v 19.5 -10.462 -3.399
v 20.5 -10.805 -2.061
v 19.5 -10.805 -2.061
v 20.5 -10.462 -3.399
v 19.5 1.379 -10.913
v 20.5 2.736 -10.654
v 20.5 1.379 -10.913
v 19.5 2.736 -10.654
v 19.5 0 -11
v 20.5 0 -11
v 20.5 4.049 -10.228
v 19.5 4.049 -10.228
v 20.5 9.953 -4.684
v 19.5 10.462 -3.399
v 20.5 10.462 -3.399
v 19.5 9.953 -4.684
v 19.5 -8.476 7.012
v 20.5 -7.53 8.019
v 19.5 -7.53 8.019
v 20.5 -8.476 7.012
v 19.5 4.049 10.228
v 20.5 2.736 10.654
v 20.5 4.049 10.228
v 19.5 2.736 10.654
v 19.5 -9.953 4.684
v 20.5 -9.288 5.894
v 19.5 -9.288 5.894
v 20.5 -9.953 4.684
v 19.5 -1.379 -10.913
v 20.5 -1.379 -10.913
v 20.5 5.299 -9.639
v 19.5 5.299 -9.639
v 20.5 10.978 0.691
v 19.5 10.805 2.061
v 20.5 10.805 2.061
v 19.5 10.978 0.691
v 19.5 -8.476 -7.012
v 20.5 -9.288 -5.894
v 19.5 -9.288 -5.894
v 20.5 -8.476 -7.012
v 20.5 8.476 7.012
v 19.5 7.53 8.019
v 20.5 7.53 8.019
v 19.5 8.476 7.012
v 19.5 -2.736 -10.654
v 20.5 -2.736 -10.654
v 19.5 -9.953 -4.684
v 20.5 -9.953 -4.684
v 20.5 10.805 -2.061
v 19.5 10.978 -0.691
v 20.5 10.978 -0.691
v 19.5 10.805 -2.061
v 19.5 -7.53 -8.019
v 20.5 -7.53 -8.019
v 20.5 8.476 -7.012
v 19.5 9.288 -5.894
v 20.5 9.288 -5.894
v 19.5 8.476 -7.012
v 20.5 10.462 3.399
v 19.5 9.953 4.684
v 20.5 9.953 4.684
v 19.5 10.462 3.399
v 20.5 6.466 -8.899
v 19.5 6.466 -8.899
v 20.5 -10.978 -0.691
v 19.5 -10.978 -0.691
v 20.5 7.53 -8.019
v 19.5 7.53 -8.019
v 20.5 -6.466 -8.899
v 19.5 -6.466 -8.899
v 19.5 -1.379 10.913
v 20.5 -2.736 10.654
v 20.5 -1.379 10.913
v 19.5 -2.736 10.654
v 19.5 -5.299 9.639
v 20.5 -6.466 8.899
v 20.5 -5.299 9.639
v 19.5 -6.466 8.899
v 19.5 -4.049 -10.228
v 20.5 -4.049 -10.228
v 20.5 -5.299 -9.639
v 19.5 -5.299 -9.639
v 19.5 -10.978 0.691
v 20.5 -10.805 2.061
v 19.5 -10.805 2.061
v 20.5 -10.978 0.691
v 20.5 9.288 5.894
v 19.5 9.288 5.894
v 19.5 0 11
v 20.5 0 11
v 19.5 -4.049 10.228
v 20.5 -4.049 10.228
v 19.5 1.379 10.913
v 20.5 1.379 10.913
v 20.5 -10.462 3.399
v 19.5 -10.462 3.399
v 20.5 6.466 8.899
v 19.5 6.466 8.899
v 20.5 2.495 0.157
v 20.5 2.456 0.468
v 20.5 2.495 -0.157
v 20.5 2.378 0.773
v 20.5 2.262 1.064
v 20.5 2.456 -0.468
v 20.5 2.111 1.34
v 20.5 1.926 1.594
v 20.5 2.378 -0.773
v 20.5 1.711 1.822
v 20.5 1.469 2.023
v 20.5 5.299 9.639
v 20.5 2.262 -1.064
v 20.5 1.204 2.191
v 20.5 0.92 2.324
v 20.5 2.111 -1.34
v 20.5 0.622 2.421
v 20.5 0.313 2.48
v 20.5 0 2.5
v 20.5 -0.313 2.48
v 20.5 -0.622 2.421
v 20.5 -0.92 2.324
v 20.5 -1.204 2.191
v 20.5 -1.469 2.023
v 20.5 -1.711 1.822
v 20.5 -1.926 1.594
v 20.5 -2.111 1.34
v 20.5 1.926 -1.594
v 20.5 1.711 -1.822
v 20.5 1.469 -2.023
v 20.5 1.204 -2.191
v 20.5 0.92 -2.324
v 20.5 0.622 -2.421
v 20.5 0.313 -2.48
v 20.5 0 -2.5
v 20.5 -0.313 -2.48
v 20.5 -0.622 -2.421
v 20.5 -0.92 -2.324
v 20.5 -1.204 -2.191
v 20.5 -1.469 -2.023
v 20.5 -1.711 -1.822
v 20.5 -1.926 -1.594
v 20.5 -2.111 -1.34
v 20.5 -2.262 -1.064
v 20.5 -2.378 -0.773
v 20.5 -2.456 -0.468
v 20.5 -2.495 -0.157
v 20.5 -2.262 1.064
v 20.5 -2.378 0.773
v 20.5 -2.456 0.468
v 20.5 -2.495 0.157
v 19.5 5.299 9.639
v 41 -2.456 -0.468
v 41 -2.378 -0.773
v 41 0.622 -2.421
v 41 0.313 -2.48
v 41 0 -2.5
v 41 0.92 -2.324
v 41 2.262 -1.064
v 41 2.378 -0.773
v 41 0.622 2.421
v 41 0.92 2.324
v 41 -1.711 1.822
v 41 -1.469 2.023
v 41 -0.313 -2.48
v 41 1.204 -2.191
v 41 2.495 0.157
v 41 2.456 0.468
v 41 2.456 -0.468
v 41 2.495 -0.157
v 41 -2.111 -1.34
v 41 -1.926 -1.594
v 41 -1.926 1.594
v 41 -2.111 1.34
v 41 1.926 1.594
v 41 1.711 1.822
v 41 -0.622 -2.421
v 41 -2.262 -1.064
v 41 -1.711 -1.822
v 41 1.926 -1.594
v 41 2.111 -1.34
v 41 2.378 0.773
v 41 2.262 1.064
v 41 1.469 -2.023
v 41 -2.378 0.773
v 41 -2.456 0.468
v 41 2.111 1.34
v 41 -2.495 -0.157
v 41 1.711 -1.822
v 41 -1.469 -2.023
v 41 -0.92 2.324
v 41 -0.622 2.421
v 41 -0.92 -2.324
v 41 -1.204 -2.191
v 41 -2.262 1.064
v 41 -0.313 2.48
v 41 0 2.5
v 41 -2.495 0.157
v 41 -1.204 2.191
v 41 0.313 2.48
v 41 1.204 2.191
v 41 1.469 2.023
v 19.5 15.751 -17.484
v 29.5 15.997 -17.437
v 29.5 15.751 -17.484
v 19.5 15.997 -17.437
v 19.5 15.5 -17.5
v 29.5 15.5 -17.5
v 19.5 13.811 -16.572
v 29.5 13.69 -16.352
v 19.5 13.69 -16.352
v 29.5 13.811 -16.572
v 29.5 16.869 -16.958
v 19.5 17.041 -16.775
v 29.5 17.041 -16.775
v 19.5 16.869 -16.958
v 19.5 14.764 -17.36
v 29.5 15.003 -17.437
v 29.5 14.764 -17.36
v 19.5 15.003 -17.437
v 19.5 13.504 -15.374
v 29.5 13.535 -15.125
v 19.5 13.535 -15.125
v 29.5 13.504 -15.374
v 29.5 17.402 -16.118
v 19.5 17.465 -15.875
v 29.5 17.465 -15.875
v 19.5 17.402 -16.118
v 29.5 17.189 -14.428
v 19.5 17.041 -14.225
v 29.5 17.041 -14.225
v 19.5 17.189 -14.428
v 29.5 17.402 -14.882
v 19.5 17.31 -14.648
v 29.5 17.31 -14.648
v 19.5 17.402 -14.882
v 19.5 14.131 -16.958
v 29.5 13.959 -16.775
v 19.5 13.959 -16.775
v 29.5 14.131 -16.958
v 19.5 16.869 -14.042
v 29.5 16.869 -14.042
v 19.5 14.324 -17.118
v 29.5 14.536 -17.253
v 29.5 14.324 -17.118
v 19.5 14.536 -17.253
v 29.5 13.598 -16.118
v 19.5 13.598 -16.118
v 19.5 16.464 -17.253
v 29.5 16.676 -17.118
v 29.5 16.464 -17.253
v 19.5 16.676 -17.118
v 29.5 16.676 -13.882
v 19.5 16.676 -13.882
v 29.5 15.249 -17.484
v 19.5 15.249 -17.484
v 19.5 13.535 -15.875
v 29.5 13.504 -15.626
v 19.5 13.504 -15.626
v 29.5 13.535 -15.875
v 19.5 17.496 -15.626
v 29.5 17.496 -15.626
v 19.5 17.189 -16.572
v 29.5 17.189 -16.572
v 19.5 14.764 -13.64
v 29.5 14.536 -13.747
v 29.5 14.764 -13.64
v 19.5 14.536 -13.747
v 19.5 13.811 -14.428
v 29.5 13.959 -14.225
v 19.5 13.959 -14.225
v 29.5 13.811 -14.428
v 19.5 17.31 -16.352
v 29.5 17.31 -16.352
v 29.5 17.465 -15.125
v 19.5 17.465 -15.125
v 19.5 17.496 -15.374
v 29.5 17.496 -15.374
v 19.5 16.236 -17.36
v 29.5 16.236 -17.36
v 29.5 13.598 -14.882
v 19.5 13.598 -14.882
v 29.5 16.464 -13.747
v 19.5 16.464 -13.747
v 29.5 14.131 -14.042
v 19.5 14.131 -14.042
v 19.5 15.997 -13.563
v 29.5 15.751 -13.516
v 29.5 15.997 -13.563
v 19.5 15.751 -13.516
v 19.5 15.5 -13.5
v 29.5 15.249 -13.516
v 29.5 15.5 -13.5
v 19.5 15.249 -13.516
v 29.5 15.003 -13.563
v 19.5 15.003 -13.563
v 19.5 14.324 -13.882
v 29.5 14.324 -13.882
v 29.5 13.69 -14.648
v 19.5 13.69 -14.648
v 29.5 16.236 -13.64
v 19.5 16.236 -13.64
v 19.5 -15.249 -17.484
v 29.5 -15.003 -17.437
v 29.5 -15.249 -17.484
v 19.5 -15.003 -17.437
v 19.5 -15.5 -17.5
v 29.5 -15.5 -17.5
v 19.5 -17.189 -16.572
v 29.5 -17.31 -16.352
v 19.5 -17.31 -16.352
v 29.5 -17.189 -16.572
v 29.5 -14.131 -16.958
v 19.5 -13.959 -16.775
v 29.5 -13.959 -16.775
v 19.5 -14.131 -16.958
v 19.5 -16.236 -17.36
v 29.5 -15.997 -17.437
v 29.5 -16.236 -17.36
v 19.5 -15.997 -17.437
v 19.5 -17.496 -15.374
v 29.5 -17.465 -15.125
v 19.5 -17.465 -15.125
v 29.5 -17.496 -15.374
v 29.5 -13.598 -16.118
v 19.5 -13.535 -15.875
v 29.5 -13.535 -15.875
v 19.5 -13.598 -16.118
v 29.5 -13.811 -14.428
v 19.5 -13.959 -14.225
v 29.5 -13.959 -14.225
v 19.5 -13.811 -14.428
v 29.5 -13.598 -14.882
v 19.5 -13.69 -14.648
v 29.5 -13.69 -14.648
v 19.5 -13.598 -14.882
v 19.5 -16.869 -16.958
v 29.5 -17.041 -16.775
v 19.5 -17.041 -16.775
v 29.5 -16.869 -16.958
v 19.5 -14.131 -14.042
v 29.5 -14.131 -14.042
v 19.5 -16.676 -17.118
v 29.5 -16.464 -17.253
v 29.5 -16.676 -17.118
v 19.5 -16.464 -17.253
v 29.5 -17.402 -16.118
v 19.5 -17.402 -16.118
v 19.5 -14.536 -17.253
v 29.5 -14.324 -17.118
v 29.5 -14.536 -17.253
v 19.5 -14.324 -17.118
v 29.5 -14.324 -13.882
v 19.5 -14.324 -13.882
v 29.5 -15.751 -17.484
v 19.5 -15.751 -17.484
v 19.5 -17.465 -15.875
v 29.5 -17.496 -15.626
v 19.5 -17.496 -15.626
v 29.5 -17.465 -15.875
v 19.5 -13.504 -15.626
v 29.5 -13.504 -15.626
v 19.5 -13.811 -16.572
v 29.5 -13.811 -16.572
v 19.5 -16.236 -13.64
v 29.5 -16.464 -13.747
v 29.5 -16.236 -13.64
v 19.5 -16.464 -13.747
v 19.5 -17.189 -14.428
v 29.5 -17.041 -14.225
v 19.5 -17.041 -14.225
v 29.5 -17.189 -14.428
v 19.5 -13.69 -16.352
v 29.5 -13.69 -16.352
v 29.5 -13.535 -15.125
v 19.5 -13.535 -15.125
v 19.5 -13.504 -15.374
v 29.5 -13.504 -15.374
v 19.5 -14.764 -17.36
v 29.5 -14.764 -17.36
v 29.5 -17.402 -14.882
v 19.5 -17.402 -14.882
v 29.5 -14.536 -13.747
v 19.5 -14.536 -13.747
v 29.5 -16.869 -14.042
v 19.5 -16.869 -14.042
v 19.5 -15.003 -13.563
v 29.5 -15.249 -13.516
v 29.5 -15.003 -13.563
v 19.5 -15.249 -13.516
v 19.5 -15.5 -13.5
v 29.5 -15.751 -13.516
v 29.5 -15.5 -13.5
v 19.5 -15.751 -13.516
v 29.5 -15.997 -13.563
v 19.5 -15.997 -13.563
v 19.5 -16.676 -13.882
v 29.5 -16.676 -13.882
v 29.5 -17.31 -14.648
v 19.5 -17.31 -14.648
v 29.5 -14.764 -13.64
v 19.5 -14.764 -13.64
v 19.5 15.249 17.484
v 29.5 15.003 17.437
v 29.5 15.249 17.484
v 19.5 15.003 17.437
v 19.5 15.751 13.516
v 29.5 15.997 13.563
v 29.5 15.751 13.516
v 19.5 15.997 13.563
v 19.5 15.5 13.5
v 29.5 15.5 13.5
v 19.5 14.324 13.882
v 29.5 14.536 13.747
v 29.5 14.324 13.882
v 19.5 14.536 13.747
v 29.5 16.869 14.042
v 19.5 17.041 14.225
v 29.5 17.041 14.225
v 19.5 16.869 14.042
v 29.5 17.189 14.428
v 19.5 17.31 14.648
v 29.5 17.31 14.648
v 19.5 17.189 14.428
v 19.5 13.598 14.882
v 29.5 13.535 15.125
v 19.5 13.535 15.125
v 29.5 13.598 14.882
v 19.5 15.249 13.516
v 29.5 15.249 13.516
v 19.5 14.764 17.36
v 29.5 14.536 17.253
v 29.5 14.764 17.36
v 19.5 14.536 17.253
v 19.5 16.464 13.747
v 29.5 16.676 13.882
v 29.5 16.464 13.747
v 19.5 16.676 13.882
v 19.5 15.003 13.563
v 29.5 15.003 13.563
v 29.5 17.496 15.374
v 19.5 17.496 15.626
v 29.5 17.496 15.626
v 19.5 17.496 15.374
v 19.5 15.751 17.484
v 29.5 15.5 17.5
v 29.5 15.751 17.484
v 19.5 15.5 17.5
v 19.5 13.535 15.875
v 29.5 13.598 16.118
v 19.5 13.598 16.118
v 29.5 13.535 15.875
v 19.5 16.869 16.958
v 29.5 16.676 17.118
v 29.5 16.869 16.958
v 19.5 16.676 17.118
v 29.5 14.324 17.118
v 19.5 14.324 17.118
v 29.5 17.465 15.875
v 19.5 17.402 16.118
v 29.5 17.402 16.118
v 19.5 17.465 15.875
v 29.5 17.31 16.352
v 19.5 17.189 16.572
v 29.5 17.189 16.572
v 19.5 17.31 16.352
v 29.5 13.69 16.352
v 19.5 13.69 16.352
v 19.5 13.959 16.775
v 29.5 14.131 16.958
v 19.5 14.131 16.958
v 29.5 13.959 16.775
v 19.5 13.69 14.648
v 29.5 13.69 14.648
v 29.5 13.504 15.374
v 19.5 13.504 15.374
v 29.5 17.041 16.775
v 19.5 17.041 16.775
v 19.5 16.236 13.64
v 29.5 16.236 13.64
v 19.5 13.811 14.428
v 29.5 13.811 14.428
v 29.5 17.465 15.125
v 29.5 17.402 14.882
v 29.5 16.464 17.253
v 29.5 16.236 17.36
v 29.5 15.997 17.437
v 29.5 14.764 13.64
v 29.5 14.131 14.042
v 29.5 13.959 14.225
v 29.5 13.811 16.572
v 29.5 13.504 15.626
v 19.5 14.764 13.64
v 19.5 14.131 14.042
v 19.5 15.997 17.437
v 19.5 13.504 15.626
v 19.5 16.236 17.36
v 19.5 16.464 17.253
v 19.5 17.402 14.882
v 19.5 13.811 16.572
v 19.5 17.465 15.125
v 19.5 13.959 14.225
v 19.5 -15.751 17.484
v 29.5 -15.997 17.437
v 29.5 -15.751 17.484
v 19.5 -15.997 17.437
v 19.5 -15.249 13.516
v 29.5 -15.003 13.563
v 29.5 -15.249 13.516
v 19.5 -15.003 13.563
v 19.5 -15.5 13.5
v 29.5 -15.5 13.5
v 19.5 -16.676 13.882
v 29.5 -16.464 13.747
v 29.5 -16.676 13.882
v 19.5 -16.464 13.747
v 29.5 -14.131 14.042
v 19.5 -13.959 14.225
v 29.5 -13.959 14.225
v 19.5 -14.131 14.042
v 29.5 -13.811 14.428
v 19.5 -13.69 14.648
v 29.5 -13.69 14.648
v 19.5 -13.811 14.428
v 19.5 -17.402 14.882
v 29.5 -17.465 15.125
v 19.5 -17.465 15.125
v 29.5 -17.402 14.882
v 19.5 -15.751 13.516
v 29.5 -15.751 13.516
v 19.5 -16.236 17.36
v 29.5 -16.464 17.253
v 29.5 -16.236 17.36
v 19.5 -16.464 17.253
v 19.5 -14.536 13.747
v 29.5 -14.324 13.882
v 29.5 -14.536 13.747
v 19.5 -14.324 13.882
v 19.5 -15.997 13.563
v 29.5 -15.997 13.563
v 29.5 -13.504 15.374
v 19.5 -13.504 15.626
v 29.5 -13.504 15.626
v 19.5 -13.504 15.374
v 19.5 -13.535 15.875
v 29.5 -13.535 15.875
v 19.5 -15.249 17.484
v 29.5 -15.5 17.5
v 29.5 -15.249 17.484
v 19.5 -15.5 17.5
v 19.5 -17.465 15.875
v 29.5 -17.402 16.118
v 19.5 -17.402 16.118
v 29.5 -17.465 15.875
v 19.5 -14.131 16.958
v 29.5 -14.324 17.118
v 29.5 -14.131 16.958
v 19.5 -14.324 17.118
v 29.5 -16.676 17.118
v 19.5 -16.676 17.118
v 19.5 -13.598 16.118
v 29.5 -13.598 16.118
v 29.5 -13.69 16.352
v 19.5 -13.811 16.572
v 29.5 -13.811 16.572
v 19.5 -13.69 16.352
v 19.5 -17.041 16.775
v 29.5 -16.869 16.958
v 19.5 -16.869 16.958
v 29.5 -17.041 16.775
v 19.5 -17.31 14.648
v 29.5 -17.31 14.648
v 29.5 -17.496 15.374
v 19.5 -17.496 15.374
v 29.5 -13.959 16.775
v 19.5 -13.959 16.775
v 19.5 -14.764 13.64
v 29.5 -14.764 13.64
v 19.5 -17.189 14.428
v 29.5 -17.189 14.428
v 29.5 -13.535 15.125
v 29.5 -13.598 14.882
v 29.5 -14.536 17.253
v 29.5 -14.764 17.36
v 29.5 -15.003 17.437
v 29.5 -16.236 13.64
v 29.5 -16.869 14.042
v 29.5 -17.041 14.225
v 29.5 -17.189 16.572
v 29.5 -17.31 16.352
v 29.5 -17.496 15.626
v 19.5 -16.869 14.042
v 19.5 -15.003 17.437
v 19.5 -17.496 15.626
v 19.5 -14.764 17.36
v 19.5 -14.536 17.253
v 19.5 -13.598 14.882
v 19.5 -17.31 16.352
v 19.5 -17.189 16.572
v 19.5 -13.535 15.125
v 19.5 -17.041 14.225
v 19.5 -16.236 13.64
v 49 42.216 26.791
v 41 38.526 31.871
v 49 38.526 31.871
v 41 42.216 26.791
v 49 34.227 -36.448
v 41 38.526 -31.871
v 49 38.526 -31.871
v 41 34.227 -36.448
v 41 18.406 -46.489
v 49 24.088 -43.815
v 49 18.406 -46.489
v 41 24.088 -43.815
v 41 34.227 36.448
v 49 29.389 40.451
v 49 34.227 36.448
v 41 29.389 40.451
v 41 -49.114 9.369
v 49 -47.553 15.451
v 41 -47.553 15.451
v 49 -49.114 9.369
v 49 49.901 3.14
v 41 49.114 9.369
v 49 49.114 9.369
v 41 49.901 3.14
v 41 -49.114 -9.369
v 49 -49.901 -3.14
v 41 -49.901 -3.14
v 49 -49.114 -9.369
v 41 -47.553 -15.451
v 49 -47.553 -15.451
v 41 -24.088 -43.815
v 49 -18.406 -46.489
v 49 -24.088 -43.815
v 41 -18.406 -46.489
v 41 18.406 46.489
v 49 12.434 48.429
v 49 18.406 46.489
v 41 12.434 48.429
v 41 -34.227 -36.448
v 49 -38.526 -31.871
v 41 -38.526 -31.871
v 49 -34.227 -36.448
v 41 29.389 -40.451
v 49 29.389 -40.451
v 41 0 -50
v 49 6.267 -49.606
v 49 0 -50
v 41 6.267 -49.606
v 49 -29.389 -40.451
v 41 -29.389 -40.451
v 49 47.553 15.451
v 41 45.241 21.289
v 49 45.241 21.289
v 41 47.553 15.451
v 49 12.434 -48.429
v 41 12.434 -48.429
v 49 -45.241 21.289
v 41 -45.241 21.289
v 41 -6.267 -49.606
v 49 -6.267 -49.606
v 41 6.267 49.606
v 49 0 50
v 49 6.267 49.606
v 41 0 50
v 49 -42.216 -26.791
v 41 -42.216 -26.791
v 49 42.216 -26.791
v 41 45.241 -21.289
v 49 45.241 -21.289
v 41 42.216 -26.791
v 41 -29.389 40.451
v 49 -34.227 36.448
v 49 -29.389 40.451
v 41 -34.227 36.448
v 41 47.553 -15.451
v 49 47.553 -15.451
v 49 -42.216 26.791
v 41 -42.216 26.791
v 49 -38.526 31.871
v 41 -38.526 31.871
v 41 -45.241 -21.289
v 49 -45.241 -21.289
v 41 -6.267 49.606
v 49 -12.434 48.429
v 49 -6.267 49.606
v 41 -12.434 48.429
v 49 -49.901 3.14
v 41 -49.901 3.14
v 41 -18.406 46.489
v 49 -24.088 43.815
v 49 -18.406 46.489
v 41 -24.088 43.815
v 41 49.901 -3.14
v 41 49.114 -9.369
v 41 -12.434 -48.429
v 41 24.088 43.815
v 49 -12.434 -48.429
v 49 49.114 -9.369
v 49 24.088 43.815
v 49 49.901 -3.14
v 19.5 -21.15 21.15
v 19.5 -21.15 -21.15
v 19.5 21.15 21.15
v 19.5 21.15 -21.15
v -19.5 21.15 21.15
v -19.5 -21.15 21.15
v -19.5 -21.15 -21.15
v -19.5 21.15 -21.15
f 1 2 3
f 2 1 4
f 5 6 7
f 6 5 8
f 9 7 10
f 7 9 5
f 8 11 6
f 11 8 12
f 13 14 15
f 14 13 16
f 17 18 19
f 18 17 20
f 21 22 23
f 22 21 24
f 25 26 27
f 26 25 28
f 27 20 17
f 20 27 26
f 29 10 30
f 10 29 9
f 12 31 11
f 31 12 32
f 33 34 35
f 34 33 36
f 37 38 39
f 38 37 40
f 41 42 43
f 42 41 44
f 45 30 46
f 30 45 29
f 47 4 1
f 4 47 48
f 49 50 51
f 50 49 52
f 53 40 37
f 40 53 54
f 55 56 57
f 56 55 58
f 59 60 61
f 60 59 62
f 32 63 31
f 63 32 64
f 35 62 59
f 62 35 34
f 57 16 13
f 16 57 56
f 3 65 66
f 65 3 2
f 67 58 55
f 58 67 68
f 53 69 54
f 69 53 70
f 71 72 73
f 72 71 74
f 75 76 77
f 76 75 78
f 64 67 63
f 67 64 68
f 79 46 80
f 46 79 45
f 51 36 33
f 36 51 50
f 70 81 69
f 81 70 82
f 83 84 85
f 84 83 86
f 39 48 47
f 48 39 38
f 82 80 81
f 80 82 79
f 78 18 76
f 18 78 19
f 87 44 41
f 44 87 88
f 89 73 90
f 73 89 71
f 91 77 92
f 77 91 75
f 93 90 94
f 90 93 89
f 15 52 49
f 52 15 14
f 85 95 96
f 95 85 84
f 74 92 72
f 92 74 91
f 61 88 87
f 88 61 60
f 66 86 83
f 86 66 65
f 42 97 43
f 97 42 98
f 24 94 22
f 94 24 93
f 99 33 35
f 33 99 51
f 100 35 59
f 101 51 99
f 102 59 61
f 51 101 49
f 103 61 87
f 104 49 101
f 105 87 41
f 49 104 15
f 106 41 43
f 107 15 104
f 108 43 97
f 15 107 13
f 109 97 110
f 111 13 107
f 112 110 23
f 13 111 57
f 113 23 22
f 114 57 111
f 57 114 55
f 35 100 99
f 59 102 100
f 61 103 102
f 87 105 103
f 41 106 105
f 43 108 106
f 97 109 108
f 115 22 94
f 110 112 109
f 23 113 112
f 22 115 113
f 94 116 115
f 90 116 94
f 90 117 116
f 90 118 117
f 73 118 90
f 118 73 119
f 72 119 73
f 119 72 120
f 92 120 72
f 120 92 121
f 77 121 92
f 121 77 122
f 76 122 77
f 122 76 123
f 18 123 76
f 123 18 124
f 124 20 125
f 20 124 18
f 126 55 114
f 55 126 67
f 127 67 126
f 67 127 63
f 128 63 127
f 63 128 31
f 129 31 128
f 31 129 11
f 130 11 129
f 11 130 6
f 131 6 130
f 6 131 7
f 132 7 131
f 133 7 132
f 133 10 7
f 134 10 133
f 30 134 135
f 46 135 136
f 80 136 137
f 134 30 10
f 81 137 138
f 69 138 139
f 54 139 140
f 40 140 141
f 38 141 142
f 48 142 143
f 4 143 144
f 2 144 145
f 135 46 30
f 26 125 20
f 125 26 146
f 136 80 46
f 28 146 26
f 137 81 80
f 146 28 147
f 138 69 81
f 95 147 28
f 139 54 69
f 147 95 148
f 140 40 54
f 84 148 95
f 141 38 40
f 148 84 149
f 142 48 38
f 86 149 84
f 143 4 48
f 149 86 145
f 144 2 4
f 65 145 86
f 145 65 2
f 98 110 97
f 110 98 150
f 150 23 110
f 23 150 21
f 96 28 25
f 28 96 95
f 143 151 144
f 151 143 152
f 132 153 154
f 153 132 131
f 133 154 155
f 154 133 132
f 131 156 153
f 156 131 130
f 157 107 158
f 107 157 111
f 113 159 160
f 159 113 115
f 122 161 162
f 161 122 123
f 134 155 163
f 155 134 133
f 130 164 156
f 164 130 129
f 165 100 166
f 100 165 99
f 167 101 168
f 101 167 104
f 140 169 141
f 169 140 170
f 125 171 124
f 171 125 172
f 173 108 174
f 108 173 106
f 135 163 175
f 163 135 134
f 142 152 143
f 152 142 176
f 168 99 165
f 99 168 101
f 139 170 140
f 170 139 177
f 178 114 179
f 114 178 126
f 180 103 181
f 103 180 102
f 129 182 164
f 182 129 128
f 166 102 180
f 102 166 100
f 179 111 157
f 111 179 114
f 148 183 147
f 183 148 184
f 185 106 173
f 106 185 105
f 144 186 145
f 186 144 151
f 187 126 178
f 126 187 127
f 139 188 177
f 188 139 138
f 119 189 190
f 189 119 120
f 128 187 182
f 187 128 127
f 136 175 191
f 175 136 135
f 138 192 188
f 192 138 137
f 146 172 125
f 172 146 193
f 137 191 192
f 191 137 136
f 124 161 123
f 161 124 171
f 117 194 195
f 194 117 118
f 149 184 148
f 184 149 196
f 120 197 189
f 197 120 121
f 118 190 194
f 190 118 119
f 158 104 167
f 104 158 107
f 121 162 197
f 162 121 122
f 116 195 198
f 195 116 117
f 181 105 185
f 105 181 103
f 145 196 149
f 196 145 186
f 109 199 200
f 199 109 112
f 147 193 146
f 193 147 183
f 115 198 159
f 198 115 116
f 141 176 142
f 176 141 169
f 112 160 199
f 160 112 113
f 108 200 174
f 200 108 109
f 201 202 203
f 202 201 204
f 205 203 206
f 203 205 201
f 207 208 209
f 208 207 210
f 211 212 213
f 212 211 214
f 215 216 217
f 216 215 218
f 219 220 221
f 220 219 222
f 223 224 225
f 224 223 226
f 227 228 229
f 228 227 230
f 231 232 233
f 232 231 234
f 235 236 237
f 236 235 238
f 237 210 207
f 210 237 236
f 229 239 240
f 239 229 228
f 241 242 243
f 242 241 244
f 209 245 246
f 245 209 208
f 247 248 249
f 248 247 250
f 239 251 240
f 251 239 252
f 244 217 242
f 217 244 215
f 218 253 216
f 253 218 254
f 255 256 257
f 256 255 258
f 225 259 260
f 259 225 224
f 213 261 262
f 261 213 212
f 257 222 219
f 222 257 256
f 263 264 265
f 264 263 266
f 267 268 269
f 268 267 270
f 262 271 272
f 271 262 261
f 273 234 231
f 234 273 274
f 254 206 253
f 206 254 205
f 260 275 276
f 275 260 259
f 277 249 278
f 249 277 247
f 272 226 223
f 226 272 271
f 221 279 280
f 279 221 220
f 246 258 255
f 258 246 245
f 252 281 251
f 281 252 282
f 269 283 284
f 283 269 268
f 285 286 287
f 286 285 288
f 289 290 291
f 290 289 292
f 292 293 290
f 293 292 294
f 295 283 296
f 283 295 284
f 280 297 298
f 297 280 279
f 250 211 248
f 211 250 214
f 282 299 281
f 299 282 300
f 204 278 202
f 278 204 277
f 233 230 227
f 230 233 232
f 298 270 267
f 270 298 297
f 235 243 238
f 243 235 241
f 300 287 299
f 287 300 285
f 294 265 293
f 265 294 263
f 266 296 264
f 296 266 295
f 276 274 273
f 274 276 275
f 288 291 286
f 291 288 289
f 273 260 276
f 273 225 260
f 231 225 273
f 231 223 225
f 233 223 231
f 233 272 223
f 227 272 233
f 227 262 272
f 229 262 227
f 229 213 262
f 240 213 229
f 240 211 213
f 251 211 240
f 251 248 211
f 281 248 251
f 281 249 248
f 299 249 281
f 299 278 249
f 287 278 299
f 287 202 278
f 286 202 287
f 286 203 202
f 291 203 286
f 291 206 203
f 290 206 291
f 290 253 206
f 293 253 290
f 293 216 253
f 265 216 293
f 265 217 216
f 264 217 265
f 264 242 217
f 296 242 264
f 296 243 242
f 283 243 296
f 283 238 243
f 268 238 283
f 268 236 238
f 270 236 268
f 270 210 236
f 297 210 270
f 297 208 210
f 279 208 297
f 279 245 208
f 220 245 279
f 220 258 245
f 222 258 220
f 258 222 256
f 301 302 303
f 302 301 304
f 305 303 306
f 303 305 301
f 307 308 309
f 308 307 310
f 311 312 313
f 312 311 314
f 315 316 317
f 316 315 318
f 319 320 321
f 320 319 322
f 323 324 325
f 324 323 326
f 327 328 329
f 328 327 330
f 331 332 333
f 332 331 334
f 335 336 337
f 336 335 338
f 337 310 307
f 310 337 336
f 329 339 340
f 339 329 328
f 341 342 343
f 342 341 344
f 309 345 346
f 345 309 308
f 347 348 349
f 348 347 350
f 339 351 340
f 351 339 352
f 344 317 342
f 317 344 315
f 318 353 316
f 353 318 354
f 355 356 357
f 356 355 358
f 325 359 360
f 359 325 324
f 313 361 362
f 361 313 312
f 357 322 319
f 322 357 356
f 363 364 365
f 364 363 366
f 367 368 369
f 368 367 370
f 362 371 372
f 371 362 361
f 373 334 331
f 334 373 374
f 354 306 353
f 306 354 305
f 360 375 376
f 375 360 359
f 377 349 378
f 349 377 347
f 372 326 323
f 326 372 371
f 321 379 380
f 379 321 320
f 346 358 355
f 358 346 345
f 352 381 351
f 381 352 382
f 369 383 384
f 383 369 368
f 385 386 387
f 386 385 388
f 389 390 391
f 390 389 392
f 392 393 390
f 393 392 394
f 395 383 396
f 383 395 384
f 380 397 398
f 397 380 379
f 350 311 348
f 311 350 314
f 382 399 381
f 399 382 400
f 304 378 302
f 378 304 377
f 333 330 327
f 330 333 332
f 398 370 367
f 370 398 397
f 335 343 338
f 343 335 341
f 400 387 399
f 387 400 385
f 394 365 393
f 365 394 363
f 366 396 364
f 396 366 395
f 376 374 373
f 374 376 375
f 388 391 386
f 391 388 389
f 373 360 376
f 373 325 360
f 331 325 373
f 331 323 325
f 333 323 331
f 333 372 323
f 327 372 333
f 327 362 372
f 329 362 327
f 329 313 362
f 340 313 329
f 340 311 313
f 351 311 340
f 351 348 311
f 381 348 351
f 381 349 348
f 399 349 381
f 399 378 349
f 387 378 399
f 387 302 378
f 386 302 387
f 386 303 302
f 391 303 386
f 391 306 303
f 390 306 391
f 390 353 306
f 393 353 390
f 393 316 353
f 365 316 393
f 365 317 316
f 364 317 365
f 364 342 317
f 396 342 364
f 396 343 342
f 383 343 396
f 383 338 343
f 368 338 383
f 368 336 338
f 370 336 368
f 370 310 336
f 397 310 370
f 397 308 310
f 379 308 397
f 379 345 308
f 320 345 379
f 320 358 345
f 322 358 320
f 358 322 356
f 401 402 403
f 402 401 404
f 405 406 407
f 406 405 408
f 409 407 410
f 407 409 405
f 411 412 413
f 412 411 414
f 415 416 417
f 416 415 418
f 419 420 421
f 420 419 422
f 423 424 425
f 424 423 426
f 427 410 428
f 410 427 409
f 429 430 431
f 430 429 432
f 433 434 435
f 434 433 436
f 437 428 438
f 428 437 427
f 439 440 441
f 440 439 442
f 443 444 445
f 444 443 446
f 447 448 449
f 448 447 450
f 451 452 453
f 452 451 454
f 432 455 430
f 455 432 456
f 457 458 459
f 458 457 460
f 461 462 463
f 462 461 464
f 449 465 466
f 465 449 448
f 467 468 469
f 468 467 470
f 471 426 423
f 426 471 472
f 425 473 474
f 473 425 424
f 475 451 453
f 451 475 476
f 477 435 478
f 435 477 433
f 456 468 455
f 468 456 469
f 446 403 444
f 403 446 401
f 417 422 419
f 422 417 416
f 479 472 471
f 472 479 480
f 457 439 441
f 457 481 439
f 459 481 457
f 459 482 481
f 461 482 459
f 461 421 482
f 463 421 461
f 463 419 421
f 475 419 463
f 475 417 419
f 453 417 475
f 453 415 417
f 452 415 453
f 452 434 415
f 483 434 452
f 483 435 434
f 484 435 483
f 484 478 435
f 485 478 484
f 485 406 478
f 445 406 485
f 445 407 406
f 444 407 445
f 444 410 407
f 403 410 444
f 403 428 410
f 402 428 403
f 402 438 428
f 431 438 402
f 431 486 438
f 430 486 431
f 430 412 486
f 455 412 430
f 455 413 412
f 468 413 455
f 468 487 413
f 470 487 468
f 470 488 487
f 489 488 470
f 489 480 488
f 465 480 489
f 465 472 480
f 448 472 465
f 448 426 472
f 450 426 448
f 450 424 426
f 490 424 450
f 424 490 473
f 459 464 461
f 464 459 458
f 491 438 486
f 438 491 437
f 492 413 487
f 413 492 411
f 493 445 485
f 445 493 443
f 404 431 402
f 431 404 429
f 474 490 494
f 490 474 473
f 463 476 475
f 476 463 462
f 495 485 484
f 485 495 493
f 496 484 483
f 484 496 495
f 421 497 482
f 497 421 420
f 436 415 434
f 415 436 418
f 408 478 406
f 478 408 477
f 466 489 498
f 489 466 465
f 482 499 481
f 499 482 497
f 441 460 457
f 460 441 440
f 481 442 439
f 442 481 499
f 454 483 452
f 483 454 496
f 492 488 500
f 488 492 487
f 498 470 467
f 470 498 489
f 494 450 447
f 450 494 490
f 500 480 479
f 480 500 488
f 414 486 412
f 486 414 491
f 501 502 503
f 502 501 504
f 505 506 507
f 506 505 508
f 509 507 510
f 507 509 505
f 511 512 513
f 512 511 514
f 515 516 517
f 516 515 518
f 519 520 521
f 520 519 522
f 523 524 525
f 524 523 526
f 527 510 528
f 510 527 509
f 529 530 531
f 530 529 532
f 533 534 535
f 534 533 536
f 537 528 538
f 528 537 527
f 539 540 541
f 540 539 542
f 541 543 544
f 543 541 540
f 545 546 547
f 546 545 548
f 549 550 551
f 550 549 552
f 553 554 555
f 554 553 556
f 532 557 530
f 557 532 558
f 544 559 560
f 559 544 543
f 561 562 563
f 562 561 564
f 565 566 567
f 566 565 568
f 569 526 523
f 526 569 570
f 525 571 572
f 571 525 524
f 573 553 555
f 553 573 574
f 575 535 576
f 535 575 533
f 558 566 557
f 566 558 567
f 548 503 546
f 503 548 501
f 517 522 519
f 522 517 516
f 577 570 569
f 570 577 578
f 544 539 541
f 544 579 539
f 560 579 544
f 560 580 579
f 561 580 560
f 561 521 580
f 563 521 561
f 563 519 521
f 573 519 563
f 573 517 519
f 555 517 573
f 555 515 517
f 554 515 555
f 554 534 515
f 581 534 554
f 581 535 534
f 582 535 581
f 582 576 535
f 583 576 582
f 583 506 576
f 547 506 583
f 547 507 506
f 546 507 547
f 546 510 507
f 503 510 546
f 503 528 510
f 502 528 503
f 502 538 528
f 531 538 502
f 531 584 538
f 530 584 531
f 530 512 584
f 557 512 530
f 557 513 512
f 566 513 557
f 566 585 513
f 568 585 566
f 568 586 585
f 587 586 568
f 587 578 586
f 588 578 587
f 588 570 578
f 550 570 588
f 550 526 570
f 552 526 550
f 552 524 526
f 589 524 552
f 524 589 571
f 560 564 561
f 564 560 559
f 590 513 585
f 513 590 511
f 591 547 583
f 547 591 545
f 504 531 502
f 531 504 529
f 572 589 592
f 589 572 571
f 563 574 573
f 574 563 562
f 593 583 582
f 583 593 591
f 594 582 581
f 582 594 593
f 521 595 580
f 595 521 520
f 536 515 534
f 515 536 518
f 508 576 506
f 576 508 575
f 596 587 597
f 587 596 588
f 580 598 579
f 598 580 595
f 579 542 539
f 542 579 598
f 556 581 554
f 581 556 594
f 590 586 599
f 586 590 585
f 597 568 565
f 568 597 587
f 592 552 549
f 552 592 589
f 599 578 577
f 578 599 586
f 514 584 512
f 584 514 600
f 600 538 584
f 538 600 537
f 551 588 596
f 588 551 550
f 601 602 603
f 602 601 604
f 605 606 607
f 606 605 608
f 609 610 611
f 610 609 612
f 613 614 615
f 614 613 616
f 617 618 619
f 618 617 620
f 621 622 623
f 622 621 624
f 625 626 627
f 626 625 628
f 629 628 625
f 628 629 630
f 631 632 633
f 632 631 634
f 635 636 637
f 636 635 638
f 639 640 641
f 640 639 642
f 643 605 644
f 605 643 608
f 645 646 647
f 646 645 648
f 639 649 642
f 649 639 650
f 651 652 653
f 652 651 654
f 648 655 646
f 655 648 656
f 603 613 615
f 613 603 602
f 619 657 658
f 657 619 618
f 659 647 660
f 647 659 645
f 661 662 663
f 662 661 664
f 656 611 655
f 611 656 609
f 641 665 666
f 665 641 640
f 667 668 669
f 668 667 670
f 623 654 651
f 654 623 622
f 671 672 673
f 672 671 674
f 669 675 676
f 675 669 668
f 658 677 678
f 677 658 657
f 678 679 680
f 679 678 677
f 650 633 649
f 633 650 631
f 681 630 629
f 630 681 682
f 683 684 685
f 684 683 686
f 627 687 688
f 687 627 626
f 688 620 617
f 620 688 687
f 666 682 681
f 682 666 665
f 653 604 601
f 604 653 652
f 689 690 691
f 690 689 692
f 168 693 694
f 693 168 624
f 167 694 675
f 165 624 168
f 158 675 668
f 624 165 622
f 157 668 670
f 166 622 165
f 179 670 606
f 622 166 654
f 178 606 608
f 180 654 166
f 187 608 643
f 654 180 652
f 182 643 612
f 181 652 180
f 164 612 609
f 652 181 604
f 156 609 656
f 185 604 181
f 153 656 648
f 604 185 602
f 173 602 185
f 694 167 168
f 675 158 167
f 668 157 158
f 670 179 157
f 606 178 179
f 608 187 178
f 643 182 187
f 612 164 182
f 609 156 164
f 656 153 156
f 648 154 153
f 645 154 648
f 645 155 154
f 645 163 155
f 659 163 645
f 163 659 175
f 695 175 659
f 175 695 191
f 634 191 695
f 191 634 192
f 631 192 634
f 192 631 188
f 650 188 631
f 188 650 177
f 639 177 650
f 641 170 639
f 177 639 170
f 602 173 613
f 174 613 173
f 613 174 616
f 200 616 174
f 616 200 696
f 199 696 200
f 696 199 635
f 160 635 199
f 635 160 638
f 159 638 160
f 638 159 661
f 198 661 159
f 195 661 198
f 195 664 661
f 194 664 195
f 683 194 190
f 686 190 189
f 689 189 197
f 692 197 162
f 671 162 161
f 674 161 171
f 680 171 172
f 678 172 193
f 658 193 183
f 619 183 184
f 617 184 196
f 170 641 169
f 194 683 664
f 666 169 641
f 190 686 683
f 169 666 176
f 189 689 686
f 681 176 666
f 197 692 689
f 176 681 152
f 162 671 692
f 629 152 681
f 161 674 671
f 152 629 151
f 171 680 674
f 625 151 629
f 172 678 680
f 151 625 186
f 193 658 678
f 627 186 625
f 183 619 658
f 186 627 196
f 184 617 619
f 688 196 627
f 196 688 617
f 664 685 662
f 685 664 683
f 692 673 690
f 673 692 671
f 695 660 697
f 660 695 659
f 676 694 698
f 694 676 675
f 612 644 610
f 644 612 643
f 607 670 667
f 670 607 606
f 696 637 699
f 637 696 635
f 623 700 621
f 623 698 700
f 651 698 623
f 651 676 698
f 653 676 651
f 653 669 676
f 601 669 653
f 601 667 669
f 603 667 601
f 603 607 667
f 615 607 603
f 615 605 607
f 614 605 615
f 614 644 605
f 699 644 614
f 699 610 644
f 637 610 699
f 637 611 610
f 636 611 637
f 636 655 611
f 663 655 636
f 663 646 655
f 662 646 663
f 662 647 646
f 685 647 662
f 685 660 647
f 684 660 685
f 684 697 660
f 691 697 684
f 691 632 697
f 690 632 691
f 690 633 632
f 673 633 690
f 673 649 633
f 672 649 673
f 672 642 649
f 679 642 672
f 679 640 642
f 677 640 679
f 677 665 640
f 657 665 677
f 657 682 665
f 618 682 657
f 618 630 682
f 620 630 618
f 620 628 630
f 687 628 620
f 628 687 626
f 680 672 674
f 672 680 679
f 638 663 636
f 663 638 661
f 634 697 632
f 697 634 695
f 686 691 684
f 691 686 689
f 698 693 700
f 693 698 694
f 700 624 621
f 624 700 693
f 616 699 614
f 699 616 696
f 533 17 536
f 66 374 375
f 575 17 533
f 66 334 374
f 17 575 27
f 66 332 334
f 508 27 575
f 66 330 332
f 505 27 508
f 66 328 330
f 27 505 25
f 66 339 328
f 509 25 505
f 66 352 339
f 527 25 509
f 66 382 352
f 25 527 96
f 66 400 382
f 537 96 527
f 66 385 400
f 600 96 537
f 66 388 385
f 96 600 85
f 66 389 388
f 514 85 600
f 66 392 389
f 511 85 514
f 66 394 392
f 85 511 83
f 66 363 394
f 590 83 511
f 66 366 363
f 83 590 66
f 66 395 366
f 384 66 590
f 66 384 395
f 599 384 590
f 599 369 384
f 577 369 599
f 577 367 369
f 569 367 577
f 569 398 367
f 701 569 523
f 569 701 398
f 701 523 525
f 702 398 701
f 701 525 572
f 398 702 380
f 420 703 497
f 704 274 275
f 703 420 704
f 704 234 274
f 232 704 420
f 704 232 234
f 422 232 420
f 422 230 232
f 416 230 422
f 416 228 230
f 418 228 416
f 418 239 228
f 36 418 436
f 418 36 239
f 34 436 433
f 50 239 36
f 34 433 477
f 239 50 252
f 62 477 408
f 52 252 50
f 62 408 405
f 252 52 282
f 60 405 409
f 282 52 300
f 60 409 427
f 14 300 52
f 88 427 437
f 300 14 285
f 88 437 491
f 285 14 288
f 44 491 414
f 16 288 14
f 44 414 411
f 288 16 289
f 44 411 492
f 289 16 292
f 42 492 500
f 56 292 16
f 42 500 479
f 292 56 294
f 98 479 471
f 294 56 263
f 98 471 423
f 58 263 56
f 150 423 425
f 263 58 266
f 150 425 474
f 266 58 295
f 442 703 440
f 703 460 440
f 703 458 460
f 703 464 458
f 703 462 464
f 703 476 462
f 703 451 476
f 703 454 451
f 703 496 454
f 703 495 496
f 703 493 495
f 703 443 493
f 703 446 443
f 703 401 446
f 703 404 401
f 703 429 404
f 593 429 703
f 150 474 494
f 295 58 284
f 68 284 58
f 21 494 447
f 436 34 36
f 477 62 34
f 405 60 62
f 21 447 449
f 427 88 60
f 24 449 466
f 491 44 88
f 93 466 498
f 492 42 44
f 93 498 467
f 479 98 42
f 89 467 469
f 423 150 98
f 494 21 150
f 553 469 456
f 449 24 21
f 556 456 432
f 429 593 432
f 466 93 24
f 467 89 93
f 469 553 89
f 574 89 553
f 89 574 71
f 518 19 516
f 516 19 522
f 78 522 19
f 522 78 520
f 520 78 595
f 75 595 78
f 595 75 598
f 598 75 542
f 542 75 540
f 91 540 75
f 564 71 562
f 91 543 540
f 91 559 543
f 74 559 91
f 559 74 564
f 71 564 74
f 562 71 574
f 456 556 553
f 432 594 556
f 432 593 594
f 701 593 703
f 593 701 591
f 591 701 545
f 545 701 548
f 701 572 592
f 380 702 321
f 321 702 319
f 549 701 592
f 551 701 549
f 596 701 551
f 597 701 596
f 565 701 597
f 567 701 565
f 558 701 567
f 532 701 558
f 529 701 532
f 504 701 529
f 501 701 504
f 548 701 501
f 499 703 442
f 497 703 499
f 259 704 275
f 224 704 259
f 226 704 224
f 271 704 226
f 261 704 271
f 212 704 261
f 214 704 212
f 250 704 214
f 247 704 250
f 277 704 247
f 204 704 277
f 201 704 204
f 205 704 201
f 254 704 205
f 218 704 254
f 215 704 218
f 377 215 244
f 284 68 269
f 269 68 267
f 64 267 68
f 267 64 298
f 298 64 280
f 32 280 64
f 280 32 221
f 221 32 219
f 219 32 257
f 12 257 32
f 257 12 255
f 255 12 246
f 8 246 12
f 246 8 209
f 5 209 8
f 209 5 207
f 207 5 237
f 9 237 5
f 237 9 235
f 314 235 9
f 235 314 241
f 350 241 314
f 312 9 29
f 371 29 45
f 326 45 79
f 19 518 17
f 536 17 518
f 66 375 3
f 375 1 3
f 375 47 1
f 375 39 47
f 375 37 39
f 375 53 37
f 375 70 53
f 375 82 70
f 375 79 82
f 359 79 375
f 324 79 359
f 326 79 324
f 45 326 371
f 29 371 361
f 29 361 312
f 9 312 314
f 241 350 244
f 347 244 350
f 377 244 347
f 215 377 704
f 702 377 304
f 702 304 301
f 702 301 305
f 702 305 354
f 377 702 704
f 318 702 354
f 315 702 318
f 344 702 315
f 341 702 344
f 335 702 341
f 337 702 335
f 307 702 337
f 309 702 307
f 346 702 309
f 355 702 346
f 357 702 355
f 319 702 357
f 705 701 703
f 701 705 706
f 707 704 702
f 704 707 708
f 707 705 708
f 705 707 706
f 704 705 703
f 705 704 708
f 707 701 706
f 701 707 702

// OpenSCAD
$fn = 50;



module wheel(){
    translate([45, 0,0]){
        rotate([0,90,0]){
            cylinder(8, d=100,center = true);
            
         }
     }
    
}

module nema17(){
        wheel();
        cube([39, 42.3, 42.3], center = true);
        translate([19.5, 0, 0]){

            for(i=[0:4]){
                rotate([0,90, 0]){
                    translate([15.5, 15.5, 0]){
                        cylinder(20, d = 4, center = true);
                    }
                    translate([15.5, -15.5, 0]){
                        cylinder(20, d = 4, center = true);
                    }
                    translate([-15.5, 15.5, 0]){
                        cylinder(20, d = 4, center = true);
                    }
                    translate([-15.5, -15.5, 0]){
                        cylinder(20, d = 4, center = true);
                    }
                }
            }
        
    }
    
  
}
module shaft(){

    difference(){
        translate([32.5, 0, 0]){
            rotate([0, 90, 0]){
                translate([0, 0, -13]){
                    cylinder(2,d=22, center = true);
                }
                cylinder(26, d = 5, center = true);
            }
        }
    }
}
shaft();
nema17();
